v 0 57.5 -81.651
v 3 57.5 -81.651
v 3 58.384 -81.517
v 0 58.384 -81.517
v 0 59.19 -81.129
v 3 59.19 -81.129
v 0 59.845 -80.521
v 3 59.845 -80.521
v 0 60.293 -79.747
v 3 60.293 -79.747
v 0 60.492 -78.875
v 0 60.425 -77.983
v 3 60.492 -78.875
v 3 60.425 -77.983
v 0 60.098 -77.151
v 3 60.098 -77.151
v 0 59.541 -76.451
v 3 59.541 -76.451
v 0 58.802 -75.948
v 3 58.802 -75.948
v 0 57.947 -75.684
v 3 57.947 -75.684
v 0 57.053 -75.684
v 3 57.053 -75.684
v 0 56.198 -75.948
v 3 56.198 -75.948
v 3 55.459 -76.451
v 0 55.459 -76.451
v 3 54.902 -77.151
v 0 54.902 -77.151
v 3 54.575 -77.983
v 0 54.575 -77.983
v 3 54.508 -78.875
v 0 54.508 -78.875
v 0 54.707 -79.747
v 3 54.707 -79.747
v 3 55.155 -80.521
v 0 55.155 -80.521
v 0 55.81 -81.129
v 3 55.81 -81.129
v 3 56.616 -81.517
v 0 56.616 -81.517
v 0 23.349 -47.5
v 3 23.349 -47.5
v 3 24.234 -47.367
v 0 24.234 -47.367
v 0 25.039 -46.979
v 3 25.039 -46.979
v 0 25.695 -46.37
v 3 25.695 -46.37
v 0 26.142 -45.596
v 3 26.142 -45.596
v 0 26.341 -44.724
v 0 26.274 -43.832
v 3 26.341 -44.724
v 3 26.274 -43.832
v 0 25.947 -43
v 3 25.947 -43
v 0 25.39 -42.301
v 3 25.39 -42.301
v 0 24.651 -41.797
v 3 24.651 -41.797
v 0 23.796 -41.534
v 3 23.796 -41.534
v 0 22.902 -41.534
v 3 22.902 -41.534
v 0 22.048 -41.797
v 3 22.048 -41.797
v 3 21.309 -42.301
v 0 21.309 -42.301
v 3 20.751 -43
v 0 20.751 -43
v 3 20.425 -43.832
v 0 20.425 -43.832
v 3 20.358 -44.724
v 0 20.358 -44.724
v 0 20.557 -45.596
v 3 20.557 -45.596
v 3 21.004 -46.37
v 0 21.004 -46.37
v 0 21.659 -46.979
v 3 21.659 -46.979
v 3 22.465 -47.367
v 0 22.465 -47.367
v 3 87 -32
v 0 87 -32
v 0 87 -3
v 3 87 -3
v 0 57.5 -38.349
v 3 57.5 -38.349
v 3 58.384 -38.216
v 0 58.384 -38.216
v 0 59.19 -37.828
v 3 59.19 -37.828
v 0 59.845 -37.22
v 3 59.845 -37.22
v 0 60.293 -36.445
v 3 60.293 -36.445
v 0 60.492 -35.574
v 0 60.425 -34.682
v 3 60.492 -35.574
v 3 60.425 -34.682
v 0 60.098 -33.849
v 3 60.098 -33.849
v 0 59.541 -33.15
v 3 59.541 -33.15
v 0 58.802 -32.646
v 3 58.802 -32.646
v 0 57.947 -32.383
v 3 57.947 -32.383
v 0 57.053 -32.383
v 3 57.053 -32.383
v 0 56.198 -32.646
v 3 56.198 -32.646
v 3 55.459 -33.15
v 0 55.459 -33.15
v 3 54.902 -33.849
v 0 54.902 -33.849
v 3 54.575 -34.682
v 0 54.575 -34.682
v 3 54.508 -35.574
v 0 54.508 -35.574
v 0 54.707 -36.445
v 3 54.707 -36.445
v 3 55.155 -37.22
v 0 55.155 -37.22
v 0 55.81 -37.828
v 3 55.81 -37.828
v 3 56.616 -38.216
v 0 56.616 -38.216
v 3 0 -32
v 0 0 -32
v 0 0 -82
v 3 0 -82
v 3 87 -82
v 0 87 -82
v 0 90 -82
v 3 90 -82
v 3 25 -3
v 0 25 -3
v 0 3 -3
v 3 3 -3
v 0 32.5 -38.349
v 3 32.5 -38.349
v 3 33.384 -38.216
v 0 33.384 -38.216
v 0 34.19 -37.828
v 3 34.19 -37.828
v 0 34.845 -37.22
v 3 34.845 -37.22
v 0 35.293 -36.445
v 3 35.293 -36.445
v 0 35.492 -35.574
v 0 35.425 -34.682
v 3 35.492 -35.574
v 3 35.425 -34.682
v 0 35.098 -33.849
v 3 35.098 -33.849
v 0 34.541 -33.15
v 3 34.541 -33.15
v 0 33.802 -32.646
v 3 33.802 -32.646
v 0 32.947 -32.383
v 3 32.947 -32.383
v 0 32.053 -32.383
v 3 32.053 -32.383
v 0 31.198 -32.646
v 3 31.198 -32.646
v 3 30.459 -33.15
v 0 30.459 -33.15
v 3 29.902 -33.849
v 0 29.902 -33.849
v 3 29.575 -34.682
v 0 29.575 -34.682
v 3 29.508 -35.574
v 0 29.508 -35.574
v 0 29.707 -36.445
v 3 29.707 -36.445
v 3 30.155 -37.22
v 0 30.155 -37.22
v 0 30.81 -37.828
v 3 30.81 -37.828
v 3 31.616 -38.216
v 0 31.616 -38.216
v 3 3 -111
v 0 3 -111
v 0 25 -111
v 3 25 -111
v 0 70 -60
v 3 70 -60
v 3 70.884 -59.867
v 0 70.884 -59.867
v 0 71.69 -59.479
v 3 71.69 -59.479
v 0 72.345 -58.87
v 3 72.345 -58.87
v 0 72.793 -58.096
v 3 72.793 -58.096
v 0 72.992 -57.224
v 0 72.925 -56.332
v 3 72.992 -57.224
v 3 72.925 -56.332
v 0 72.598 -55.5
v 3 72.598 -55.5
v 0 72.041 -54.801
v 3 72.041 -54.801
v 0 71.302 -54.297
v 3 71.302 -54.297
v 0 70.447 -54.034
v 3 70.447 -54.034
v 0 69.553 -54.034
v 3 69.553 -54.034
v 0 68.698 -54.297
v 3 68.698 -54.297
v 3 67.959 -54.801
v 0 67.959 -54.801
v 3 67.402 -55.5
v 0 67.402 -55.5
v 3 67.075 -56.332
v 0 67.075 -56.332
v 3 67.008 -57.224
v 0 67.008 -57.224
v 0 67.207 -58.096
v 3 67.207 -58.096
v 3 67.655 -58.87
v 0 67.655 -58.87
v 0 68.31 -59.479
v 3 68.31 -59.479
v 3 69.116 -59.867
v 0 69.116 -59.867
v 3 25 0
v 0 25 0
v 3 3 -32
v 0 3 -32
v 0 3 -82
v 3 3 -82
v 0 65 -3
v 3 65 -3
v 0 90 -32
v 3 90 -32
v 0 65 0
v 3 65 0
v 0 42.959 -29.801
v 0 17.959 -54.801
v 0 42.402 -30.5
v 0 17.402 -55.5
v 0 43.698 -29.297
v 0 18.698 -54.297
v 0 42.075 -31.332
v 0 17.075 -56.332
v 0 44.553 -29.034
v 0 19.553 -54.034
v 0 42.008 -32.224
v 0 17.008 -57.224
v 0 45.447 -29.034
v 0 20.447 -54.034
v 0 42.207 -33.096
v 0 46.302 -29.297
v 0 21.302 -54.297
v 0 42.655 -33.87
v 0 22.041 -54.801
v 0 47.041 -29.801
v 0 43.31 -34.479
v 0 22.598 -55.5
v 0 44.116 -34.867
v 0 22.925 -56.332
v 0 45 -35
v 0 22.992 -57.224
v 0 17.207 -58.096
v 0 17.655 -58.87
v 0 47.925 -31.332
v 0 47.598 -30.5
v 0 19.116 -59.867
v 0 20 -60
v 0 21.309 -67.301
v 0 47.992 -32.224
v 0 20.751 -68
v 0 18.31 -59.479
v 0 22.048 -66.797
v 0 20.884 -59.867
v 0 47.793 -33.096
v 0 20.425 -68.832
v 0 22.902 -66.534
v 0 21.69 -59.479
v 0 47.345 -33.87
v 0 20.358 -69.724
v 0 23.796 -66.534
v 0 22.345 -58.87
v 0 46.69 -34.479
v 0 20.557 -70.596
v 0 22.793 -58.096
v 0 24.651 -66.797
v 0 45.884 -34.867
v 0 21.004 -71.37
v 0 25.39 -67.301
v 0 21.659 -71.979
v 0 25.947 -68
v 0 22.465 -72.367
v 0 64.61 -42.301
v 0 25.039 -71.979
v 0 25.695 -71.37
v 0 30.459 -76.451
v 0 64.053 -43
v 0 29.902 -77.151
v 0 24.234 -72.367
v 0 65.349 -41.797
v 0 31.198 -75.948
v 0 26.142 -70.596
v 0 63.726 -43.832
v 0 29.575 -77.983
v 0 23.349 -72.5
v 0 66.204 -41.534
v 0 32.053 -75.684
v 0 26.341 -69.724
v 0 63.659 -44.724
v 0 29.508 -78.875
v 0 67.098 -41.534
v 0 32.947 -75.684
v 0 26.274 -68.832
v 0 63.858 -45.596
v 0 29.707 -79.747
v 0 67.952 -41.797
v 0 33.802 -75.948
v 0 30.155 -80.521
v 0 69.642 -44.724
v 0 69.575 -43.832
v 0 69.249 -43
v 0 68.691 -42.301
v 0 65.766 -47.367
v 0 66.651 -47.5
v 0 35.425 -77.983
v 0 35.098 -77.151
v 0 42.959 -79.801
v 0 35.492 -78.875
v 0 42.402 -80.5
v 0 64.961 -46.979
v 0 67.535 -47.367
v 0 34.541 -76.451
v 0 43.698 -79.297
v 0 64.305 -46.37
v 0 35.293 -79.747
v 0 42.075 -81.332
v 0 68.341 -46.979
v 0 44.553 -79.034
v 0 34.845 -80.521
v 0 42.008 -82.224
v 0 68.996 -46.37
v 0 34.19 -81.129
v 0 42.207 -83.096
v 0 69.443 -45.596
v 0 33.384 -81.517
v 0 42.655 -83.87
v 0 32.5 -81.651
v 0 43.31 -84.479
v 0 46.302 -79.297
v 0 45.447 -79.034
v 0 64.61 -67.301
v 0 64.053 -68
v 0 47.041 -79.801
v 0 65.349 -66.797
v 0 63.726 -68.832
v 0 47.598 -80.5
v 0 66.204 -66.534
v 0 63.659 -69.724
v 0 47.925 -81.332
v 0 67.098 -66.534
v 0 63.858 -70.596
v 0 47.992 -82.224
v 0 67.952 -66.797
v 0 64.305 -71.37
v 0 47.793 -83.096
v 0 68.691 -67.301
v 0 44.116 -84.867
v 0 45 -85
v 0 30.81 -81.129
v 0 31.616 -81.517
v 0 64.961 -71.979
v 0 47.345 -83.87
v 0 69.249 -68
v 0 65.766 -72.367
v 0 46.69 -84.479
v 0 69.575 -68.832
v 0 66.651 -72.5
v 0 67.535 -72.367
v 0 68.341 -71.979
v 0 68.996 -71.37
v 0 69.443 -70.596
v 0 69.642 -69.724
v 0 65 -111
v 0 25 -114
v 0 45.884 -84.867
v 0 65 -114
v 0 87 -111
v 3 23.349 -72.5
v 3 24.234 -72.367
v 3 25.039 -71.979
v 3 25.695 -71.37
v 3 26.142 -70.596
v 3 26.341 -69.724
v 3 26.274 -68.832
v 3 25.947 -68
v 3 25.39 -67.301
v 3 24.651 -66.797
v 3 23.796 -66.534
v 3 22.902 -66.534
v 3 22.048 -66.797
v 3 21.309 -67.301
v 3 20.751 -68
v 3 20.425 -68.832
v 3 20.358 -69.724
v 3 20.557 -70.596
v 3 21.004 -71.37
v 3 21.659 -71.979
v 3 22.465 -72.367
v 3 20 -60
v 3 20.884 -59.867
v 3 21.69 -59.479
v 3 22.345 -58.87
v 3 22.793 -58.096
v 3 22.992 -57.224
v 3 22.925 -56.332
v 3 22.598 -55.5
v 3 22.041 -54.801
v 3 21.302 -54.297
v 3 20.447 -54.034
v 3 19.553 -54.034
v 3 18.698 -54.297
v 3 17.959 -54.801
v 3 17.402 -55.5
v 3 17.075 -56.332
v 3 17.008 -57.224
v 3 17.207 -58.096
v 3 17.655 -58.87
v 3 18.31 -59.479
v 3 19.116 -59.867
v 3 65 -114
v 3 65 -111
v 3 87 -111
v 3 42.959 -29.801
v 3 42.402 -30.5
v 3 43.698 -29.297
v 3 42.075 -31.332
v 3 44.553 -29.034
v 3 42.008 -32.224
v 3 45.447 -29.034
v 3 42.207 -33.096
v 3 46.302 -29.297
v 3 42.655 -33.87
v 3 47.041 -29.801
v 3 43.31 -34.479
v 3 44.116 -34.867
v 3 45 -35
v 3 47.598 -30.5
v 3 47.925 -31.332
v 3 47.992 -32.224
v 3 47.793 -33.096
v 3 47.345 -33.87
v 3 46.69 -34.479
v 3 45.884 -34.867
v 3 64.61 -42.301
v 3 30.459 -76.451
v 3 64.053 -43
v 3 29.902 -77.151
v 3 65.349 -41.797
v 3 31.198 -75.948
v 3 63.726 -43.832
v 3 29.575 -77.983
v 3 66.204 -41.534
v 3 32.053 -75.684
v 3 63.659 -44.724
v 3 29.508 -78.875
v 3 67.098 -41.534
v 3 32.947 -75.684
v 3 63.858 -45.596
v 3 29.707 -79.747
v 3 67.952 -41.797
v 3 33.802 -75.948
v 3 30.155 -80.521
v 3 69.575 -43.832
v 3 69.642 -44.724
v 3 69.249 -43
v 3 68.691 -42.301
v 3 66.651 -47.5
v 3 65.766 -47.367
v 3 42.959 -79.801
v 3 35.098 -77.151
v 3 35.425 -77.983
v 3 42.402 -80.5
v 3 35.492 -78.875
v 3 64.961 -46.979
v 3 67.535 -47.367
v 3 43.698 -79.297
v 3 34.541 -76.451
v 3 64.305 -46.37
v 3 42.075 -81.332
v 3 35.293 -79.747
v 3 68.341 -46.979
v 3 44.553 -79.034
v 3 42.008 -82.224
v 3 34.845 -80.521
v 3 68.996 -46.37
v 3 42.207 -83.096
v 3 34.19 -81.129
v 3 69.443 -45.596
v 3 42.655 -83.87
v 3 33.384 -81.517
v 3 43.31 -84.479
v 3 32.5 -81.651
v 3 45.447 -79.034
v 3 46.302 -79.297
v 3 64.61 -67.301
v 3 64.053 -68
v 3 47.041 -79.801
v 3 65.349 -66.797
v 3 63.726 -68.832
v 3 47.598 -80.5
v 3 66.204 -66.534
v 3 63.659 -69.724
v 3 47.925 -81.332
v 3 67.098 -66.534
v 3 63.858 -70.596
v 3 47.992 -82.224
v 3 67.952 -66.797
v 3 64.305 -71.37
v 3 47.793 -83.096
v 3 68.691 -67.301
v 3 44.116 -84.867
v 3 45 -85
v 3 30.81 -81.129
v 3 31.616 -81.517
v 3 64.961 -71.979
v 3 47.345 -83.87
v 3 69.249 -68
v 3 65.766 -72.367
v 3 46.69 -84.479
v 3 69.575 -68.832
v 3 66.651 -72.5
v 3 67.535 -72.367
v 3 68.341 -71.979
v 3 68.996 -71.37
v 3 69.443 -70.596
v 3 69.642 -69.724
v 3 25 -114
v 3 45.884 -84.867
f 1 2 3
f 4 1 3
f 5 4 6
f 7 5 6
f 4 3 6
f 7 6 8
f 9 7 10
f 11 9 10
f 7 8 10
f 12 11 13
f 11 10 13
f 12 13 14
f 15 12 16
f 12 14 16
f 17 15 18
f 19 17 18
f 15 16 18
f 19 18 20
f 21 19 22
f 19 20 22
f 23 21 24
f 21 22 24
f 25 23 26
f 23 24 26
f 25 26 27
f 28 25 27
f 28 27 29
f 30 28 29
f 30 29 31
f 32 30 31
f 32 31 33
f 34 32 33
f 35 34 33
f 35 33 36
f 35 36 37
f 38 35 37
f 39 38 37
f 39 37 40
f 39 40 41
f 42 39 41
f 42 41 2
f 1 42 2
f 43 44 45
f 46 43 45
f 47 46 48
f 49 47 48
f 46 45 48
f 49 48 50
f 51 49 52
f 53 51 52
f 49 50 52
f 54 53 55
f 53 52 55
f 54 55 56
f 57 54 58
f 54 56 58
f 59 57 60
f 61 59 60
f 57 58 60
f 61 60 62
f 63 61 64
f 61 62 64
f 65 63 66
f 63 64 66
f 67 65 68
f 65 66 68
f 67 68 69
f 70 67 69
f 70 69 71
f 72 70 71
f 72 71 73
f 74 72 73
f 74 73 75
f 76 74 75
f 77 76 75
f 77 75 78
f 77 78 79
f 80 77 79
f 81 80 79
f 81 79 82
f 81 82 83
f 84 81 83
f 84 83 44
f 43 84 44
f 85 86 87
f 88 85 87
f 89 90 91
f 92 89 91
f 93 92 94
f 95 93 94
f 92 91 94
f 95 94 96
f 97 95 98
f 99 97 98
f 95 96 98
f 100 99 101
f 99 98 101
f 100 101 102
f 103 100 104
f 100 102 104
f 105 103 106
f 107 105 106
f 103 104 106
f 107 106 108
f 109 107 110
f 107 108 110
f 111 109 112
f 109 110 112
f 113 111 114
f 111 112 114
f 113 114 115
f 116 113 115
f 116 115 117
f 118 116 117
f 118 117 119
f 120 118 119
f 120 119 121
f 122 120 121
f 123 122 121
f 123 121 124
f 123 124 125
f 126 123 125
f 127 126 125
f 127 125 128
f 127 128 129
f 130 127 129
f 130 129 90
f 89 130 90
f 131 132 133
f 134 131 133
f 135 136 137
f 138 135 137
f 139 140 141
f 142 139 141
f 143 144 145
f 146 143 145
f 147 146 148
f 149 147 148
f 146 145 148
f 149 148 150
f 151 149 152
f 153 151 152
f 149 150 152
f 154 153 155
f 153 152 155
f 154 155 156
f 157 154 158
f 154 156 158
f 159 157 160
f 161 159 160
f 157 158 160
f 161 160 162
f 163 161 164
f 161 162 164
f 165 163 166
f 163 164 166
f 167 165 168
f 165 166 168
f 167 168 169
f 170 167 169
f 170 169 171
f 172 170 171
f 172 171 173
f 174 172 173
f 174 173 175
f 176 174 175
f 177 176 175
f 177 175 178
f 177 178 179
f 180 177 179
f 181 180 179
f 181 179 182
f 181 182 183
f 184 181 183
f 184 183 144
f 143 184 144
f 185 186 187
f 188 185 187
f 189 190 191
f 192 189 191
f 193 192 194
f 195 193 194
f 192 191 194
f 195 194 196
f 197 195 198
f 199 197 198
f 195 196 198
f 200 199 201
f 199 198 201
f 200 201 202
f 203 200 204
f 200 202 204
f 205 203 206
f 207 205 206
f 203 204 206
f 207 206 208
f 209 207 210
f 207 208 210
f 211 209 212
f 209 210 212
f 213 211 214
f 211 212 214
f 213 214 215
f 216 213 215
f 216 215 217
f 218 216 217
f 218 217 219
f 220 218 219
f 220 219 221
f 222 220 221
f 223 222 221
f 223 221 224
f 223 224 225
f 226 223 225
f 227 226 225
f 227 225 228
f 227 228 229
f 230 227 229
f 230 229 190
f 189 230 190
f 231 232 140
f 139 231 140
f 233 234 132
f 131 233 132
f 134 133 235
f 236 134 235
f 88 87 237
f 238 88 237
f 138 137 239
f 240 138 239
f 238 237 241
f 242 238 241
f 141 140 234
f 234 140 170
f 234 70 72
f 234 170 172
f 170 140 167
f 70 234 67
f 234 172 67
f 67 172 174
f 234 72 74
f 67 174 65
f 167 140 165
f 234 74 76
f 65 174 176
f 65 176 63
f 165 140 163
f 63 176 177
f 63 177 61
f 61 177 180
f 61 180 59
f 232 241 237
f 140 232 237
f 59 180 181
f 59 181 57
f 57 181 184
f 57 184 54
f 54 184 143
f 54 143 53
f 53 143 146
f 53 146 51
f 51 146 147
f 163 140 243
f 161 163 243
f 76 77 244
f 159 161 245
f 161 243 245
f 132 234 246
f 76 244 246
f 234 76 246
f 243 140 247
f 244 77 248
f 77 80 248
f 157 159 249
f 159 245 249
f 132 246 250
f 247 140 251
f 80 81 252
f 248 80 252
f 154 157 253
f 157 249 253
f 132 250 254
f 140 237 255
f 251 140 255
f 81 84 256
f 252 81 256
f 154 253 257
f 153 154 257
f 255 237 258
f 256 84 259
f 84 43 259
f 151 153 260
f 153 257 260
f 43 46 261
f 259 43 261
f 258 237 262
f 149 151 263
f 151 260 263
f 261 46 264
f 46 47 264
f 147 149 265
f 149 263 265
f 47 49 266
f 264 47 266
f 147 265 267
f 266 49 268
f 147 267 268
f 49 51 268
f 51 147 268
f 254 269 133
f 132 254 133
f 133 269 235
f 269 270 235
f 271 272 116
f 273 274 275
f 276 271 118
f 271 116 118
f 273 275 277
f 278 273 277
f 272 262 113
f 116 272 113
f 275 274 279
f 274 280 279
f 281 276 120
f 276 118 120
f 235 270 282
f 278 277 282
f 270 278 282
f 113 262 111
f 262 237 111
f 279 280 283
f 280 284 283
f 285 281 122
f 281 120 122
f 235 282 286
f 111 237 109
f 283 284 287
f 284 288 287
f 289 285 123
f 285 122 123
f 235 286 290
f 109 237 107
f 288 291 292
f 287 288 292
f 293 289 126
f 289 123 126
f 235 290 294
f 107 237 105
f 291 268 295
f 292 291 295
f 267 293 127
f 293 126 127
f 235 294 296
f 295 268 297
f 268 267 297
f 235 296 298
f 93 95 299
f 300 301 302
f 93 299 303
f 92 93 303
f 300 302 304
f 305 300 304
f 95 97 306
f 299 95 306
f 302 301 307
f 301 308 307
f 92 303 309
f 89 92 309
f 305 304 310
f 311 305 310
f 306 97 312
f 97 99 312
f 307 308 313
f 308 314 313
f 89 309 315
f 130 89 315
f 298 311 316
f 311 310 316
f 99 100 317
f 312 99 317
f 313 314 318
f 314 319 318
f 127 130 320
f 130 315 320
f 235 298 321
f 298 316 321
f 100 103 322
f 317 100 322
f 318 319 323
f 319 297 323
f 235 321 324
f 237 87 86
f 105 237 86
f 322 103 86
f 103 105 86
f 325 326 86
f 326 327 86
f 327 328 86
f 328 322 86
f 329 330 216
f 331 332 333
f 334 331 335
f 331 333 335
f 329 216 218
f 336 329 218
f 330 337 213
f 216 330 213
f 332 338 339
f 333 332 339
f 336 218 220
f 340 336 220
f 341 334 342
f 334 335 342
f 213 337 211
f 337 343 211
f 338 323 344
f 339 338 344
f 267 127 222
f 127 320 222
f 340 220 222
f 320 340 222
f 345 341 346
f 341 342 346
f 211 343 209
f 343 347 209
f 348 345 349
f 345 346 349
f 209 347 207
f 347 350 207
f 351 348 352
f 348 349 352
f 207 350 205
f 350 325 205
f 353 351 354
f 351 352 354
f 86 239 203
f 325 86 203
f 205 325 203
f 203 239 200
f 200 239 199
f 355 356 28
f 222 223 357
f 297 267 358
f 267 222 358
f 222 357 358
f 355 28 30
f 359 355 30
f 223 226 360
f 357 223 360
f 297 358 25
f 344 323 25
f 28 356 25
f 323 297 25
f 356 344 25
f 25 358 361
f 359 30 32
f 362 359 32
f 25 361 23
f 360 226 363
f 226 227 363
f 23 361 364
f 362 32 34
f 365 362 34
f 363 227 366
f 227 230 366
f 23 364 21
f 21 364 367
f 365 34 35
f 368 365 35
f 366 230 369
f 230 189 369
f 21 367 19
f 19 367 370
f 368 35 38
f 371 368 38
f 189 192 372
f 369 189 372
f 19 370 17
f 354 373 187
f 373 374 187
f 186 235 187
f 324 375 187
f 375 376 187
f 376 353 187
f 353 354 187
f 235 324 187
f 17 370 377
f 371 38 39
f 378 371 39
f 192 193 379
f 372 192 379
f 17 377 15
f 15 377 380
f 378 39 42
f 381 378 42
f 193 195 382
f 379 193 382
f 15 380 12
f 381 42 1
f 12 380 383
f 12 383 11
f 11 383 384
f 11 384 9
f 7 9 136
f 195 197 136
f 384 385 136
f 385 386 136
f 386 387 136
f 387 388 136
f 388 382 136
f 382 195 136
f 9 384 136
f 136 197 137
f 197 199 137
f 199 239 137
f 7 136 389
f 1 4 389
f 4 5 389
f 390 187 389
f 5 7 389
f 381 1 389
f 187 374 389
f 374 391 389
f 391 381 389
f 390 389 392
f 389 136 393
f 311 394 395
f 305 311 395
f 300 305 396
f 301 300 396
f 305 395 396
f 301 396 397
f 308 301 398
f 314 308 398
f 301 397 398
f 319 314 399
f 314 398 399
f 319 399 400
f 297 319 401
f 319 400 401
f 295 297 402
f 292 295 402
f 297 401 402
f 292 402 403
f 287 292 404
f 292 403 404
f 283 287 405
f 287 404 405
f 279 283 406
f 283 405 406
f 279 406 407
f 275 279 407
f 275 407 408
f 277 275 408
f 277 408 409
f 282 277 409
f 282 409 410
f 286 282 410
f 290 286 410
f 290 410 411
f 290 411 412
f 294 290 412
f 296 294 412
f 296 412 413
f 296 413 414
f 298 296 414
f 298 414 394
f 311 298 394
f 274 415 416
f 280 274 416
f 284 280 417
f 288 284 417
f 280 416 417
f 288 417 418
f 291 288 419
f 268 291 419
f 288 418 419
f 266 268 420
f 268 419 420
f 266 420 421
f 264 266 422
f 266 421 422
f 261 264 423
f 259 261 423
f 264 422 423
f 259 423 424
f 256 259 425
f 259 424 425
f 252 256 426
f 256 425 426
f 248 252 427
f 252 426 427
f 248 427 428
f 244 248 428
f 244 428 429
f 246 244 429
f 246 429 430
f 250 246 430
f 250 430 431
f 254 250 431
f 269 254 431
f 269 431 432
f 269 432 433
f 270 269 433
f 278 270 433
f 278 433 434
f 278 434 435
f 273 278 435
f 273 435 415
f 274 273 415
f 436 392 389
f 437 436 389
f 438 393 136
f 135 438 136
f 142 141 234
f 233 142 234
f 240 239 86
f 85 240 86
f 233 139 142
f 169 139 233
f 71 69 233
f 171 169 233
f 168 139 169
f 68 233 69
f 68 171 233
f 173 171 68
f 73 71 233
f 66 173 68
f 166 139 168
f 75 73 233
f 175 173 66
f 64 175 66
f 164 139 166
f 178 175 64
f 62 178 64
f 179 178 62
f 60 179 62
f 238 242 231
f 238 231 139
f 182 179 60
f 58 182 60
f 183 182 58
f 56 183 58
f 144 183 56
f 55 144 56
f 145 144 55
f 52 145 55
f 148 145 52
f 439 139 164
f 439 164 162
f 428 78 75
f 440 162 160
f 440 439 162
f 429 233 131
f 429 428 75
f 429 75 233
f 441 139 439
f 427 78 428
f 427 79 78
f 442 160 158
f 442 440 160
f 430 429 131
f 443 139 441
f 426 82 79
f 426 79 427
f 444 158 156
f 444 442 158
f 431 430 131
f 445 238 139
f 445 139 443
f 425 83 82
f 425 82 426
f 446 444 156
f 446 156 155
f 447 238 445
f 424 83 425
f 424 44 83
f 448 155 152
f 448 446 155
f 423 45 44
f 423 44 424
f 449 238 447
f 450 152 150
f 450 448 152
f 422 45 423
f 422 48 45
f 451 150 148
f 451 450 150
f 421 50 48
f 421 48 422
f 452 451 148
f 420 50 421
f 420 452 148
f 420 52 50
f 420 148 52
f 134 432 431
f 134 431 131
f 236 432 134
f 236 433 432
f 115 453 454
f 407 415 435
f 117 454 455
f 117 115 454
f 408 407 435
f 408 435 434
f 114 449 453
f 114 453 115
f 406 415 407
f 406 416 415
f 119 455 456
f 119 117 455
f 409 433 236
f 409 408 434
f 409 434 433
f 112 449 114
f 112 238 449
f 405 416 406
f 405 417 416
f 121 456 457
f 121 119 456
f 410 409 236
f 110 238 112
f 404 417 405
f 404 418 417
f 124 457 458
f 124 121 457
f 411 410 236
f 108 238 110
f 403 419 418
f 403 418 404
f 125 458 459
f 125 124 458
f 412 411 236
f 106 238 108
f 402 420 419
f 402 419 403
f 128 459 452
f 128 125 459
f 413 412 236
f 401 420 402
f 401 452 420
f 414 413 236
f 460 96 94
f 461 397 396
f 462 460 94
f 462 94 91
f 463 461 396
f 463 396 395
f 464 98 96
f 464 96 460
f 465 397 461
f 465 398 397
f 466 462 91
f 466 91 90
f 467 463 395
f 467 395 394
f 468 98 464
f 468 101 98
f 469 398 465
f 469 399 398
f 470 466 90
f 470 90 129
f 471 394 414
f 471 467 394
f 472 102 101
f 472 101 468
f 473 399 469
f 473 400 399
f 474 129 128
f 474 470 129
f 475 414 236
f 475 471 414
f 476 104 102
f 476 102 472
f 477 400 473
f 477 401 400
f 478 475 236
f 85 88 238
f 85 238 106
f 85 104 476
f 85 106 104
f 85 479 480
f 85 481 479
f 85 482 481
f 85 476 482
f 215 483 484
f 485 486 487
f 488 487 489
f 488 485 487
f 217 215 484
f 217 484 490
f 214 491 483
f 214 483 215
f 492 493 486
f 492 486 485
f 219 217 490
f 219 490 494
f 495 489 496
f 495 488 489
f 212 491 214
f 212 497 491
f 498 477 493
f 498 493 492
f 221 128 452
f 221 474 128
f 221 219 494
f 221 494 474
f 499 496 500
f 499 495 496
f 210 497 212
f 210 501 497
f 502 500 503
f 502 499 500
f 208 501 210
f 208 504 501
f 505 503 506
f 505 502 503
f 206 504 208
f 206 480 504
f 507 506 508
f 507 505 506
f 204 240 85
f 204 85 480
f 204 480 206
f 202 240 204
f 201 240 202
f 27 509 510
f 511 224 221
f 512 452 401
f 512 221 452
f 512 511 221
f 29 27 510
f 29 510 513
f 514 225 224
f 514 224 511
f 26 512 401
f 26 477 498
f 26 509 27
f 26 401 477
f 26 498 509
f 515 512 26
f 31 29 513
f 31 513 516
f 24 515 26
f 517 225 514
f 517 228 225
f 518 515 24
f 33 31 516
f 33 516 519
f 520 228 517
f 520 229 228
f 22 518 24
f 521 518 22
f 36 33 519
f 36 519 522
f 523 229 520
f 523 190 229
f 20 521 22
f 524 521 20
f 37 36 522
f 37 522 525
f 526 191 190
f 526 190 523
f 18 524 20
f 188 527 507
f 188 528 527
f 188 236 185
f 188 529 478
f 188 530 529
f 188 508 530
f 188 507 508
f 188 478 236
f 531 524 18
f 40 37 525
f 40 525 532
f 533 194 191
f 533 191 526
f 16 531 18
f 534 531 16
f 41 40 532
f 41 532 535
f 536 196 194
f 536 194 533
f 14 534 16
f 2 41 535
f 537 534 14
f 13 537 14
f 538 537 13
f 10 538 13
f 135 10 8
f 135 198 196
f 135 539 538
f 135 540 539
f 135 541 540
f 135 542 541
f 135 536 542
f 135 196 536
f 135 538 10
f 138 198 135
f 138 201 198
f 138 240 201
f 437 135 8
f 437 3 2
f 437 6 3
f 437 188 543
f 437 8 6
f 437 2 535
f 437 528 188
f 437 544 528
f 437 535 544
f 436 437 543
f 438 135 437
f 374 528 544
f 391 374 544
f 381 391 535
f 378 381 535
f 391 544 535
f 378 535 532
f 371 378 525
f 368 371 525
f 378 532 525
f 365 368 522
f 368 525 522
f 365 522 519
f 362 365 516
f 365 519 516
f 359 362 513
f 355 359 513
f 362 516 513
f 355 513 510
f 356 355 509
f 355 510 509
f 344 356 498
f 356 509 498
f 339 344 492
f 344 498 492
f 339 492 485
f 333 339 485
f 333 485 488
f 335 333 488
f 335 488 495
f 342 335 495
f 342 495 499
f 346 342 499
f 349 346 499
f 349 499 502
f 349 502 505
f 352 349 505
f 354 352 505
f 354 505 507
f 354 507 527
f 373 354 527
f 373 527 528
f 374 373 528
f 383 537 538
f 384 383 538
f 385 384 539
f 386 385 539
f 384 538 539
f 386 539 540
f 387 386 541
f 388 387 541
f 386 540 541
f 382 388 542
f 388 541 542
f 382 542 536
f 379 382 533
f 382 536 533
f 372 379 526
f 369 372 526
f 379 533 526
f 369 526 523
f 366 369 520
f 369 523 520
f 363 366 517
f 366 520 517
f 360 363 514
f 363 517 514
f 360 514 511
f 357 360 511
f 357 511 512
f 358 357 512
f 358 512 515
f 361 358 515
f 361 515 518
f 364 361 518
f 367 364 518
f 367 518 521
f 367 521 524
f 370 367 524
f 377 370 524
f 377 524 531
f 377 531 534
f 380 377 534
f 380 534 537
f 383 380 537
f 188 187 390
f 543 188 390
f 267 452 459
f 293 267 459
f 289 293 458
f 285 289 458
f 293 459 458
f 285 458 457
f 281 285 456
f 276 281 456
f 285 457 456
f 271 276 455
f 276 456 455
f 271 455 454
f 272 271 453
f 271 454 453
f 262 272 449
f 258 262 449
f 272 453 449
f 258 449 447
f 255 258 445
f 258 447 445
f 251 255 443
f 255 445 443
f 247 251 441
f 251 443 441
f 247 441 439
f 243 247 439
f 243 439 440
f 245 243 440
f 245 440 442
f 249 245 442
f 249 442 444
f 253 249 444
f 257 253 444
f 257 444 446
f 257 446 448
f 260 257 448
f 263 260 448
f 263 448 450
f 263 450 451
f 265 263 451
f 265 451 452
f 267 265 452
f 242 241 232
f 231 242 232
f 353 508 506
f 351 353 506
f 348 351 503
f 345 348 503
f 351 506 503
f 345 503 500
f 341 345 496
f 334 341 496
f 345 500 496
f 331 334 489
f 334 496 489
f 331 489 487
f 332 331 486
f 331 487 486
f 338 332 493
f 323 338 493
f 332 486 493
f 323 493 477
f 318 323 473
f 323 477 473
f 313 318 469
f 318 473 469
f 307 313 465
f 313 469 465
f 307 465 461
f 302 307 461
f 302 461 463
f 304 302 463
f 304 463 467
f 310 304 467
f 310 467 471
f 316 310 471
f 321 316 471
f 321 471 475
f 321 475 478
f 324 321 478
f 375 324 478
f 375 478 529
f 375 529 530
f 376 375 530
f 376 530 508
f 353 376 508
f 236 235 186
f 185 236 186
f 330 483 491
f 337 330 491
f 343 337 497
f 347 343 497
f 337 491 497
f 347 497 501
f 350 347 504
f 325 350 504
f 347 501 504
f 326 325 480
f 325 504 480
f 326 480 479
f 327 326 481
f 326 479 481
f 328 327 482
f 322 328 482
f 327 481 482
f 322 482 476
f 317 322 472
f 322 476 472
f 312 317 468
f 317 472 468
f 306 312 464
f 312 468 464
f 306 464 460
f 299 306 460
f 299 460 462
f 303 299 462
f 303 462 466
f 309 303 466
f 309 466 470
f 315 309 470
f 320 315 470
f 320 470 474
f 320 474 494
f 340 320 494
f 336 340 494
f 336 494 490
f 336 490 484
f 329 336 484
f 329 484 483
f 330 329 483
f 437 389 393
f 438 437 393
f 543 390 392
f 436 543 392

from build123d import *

# Parameters (mm, degrees)
EXTRUDE_1_DEPTH     = 3
SKETCH_2_R          = 3
CUT_EXTRUDE_1_DEPTH = 146.275600154


with BuildPart() as part:
    # Эскиз1 → Бобышка-Вытянуть1 (new body)
    with BuildSketch(Plane(origin=(0, 0, 0), x_dir=(0, 0, -1), z_dir=(1, 0, 0))):
        Polygon((0, 65), (0, 25), (3, 25), (3, 3), (32, 3), (32, 0), (82, 0), (82, 3), (111, 3), (111, 25), (114, 25), (114, 65), (111, 65), (111, 87), (82, 87), (82, 90), (32, 90), (32, 87), (3, 87), (3, 65), align=None)
    extrude(amount=EXTRUDE_1_DEPTH)

    # Эскиз2 → Вырез-Вытянуть1 (cut, through all)
    with BuildSketch(Plane(origin=(3, 0, 0), x_dir=(0, 0, -1), z_dir=(1, 0, 0))):
        with Locations((32, 45)):
            Circle(SKETCH_2_R)
        with Locations((35.349364905, 57.5)):
            Circle(SKETCH_2_R)
        with Locations((44.5, 66.650635095)):
            Circle(SKETCH_2_R)
        with Locations((57, 70)):
            Circle(SKETCH_2_R)
        with Locations((69.5, 66.650635095)):
            Circle(SKETCH_2_R)
        with Locations((78.650635095, 57.5)):
            Circle(SKETCH_2_R)
        with Locations((82, 45)):
            Circle(SKETCH_2_R)
        with Locations((78.650635095, 32.5)):
            Circle(SKETCH_2_R)
        with Locations((69.5, 23.349364905)):
            Circle(SKETCH_2_R)
        with Locations((57, 20)):
            Circle(SKETCH_2_R)
        with Locations((44.5, 23.349364905)):
            Circle(SKETCH_2_R)
        with Locations((35.349364905, 32.5)):
            Circle(SKETCH_2_R)
    extrude(amount=-CUT_EXTRUDE_1_DEPTH, mode=Mode.SUBTRACT)


solid = part.part
